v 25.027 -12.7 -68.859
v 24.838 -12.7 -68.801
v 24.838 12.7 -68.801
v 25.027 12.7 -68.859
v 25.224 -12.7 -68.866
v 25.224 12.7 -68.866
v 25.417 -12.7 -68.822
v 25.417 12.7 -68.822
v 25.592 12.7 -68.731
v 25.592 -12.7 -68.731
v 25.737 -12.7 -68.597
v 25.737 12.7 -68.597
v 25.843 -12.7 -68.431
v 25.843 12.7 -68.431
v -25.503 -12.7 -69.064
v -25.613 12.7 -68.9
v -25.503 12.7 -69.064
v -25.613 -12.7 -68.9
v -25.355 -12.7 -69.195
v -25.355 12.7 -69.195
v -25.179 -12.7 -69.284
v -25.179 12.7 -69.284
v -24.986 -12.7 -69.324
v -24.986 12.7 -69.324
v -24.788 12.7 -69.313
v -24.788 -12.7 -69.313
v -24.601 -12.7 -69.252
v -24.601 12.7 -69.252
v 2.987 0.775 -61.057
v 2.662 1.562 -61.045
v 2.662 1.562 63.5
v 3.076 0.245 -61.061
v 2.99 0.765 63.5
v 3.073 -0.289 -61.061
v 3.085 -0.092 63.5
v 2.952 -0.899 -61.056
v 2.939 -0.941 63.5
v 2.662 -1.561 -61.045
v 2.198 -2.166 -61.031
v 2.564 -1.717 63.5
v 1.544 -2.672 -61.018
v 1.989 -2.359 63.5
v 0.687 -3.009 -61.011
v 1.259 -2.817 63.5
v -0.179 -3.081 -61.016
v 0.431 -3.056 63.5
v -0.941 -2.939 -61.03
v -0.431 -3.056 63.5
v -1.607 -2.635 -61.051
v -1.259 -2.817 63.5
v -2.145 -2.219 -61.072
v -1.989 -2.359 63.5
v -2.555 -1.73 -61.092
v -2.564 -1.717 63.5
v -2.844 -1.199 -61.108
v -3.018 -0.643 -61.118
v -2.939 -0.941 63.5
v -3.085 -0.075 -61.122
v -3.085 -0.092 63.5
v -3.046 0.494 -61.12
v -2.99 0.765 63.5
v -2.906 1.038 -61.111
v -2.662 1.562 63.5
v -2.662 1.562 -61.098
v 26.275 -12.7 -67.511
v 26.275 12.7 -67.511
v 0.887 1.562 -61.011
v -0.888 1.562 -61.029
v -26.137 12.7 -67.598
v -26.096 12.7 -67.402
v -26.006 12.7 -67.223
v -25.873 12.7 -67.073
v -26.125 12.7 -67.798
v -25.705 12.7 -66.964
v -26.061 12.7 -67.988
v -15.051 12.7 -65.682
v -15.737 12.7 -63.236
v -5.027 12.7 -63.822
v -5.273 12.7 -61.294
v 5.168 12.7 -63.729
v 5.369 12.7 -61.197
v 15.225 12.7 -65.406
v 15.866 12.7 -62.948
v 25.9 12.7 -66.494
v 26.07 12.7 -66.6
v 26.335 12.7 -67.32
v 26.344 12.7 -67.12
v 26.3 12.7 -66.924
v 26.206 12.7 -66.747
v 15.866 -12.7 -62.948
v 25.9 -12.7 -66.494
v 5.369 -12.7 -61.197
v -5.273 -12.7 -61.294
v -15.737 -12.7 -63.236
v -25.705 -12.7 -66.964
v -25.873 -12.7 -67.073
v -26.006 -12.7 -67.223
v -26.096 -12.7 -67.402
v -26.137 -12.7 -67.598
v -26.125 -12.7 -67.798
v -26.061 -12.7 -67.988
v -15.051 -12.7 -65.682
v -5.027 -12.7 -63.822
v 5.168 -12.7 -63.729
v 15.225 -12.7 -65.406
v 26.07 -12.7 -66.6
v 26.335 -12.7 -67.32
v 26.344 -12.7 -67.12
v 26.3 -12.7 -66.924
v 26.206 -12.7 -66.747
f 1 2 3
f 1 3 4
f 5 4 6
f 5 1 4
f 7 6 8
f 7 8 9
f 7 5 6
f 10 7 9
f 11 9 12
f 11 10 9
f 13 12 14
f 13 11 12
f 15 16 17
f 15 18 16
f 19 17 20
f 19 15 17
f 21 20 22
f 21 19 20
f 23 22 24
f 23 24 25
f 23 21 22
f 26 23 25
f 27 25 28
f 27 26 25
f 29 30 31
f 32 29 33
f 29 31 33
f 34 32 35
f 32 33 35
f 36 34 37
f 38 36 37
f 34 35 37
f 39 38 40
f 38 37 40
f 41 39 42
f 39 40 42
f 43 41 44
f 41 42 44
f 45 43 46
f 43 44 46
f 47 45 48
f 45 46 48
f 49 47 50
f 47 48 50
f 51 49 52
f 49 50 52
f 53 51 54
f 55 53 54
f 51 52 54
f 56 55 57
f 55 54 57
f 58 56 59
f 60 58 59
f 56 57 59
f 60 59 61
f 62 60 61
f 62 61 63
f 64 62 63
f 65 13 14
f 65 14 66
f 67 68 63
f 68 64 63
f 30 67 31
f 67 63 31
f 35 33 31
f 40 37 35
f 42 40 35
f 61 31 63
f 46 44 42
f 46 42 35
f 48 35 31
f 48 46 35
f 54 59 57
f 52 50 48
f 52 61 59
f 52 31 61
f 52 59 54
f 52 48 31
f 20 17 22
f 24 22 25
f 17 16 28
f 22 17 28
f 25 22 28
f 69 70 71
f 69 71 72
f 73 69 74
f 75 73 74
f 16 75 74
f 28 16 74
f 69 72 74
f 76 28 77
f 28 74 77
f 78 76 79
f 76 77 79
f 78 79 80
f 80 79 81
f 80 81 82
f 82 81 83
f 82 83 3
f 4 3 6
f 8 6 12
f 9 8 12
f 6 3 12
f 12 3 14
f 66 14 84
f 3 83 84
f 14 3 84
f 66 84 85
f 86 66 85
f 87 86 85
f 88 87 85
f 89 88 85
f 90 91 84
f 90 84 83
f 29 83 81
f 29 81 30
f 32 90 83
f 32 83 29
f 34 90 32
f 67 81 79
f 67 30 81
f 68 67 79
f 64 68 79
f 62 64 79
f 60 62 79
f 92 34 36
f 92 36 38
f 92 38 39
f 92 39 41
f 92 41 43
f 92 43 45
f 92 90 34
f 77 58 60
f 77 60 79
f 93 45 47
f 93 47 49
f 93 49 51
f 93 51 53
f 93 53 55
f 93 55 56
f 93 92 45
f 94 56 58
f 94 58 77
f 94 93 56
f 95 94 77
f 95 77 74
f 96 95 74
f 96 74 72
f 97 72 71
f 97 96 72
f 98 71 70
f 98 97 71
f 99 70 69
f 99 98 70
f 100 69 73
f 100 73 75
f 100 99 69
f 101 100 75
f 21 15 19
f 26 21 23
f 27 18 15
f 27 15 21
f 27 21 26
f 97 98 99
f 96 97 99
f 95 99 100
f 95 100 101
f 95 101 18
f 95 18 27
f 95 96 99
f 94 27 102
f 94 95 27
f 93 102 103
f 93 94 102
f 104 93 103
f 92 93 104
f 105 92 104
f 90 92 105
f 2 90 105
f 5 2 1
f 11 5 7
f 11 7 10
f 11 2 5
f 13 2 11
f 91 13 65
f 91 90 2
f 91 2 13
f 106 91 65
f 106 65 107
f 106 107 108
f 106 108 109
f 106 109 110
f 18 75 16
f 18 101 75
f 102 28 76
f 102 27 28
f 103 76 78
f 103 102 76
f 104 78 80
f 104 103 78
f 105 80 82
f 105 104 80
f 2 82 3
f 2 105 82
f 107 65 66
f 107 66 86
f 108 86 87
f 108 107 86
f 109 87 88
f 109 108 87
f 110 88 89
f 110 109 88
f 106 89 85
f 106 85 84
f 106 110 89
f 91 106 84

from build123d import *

# Parameters (mm, degrees)
F0_W     = 3.0861
F0_H     = 127
F3_DEPTH = 150.2156
F5_DEPTH = 12.7


with BuildPart() as f1:
    # F0 (on Front) → F1 (revolve)
    with BuildSketch(Plane.XZ):
        with Locations((1.54305, 0)):
            Rectangle(F0_W, F0_H)
    revolve(axis=Axis((0, 0, 0), (0, 0, -1)))

    # F2 (on face) → F3 (cut)
    with BuildSketch(Plane.XY.offset(63.5)):
        with BuildLine():
            Line((-2.661552, 1.5621), (2.661552, 1.5621))
            ThreePointArc((2.661552, 1.5621), (0, 3.0861), (-2.661552, 1.5621))
        make_face()
    extrude(amount=-F3_DEPTH, mode=Mode.SUBTRACT)

    # F4 (on Front) → F5 (join, symmetric)
    with BuildSketch(Plane.XZ):
        with BuildLine():
            ThreePointArc((-24.600739, -69.251744), (0.068726, -63.553068), (24.838002, -68.80096))
            ThreePointArc((24.838002, -68.80096), (25.416693, -68.822331), (25.8433, -68.430738))
            Line((25.8433, -68.430738), (26.274608, -67.510755))
            ThreePointArc((26.274608, -67.510755), (26.299746, -66.924033), (25.900162, -66.493676))
            ThreePointArc((25.900162, -66.493676), (0.045595, -61.013174), (-25.704744, -66.964188))
            ThreePointArc((-25.704744, -66.964188), (-26.096408, -67.40174), (-26.060601, -67.987888))
            Line((-26.060601, -67.987888), (-25.612639, -68.899877))
            ThreePointArc((-25.612639, -68.899877), (-25.178963, -69.283657), (-24.600739, -69.251744))
        make_face()
    extrude(amount=F5_DEPTH, both=True)


solid = f1.part
